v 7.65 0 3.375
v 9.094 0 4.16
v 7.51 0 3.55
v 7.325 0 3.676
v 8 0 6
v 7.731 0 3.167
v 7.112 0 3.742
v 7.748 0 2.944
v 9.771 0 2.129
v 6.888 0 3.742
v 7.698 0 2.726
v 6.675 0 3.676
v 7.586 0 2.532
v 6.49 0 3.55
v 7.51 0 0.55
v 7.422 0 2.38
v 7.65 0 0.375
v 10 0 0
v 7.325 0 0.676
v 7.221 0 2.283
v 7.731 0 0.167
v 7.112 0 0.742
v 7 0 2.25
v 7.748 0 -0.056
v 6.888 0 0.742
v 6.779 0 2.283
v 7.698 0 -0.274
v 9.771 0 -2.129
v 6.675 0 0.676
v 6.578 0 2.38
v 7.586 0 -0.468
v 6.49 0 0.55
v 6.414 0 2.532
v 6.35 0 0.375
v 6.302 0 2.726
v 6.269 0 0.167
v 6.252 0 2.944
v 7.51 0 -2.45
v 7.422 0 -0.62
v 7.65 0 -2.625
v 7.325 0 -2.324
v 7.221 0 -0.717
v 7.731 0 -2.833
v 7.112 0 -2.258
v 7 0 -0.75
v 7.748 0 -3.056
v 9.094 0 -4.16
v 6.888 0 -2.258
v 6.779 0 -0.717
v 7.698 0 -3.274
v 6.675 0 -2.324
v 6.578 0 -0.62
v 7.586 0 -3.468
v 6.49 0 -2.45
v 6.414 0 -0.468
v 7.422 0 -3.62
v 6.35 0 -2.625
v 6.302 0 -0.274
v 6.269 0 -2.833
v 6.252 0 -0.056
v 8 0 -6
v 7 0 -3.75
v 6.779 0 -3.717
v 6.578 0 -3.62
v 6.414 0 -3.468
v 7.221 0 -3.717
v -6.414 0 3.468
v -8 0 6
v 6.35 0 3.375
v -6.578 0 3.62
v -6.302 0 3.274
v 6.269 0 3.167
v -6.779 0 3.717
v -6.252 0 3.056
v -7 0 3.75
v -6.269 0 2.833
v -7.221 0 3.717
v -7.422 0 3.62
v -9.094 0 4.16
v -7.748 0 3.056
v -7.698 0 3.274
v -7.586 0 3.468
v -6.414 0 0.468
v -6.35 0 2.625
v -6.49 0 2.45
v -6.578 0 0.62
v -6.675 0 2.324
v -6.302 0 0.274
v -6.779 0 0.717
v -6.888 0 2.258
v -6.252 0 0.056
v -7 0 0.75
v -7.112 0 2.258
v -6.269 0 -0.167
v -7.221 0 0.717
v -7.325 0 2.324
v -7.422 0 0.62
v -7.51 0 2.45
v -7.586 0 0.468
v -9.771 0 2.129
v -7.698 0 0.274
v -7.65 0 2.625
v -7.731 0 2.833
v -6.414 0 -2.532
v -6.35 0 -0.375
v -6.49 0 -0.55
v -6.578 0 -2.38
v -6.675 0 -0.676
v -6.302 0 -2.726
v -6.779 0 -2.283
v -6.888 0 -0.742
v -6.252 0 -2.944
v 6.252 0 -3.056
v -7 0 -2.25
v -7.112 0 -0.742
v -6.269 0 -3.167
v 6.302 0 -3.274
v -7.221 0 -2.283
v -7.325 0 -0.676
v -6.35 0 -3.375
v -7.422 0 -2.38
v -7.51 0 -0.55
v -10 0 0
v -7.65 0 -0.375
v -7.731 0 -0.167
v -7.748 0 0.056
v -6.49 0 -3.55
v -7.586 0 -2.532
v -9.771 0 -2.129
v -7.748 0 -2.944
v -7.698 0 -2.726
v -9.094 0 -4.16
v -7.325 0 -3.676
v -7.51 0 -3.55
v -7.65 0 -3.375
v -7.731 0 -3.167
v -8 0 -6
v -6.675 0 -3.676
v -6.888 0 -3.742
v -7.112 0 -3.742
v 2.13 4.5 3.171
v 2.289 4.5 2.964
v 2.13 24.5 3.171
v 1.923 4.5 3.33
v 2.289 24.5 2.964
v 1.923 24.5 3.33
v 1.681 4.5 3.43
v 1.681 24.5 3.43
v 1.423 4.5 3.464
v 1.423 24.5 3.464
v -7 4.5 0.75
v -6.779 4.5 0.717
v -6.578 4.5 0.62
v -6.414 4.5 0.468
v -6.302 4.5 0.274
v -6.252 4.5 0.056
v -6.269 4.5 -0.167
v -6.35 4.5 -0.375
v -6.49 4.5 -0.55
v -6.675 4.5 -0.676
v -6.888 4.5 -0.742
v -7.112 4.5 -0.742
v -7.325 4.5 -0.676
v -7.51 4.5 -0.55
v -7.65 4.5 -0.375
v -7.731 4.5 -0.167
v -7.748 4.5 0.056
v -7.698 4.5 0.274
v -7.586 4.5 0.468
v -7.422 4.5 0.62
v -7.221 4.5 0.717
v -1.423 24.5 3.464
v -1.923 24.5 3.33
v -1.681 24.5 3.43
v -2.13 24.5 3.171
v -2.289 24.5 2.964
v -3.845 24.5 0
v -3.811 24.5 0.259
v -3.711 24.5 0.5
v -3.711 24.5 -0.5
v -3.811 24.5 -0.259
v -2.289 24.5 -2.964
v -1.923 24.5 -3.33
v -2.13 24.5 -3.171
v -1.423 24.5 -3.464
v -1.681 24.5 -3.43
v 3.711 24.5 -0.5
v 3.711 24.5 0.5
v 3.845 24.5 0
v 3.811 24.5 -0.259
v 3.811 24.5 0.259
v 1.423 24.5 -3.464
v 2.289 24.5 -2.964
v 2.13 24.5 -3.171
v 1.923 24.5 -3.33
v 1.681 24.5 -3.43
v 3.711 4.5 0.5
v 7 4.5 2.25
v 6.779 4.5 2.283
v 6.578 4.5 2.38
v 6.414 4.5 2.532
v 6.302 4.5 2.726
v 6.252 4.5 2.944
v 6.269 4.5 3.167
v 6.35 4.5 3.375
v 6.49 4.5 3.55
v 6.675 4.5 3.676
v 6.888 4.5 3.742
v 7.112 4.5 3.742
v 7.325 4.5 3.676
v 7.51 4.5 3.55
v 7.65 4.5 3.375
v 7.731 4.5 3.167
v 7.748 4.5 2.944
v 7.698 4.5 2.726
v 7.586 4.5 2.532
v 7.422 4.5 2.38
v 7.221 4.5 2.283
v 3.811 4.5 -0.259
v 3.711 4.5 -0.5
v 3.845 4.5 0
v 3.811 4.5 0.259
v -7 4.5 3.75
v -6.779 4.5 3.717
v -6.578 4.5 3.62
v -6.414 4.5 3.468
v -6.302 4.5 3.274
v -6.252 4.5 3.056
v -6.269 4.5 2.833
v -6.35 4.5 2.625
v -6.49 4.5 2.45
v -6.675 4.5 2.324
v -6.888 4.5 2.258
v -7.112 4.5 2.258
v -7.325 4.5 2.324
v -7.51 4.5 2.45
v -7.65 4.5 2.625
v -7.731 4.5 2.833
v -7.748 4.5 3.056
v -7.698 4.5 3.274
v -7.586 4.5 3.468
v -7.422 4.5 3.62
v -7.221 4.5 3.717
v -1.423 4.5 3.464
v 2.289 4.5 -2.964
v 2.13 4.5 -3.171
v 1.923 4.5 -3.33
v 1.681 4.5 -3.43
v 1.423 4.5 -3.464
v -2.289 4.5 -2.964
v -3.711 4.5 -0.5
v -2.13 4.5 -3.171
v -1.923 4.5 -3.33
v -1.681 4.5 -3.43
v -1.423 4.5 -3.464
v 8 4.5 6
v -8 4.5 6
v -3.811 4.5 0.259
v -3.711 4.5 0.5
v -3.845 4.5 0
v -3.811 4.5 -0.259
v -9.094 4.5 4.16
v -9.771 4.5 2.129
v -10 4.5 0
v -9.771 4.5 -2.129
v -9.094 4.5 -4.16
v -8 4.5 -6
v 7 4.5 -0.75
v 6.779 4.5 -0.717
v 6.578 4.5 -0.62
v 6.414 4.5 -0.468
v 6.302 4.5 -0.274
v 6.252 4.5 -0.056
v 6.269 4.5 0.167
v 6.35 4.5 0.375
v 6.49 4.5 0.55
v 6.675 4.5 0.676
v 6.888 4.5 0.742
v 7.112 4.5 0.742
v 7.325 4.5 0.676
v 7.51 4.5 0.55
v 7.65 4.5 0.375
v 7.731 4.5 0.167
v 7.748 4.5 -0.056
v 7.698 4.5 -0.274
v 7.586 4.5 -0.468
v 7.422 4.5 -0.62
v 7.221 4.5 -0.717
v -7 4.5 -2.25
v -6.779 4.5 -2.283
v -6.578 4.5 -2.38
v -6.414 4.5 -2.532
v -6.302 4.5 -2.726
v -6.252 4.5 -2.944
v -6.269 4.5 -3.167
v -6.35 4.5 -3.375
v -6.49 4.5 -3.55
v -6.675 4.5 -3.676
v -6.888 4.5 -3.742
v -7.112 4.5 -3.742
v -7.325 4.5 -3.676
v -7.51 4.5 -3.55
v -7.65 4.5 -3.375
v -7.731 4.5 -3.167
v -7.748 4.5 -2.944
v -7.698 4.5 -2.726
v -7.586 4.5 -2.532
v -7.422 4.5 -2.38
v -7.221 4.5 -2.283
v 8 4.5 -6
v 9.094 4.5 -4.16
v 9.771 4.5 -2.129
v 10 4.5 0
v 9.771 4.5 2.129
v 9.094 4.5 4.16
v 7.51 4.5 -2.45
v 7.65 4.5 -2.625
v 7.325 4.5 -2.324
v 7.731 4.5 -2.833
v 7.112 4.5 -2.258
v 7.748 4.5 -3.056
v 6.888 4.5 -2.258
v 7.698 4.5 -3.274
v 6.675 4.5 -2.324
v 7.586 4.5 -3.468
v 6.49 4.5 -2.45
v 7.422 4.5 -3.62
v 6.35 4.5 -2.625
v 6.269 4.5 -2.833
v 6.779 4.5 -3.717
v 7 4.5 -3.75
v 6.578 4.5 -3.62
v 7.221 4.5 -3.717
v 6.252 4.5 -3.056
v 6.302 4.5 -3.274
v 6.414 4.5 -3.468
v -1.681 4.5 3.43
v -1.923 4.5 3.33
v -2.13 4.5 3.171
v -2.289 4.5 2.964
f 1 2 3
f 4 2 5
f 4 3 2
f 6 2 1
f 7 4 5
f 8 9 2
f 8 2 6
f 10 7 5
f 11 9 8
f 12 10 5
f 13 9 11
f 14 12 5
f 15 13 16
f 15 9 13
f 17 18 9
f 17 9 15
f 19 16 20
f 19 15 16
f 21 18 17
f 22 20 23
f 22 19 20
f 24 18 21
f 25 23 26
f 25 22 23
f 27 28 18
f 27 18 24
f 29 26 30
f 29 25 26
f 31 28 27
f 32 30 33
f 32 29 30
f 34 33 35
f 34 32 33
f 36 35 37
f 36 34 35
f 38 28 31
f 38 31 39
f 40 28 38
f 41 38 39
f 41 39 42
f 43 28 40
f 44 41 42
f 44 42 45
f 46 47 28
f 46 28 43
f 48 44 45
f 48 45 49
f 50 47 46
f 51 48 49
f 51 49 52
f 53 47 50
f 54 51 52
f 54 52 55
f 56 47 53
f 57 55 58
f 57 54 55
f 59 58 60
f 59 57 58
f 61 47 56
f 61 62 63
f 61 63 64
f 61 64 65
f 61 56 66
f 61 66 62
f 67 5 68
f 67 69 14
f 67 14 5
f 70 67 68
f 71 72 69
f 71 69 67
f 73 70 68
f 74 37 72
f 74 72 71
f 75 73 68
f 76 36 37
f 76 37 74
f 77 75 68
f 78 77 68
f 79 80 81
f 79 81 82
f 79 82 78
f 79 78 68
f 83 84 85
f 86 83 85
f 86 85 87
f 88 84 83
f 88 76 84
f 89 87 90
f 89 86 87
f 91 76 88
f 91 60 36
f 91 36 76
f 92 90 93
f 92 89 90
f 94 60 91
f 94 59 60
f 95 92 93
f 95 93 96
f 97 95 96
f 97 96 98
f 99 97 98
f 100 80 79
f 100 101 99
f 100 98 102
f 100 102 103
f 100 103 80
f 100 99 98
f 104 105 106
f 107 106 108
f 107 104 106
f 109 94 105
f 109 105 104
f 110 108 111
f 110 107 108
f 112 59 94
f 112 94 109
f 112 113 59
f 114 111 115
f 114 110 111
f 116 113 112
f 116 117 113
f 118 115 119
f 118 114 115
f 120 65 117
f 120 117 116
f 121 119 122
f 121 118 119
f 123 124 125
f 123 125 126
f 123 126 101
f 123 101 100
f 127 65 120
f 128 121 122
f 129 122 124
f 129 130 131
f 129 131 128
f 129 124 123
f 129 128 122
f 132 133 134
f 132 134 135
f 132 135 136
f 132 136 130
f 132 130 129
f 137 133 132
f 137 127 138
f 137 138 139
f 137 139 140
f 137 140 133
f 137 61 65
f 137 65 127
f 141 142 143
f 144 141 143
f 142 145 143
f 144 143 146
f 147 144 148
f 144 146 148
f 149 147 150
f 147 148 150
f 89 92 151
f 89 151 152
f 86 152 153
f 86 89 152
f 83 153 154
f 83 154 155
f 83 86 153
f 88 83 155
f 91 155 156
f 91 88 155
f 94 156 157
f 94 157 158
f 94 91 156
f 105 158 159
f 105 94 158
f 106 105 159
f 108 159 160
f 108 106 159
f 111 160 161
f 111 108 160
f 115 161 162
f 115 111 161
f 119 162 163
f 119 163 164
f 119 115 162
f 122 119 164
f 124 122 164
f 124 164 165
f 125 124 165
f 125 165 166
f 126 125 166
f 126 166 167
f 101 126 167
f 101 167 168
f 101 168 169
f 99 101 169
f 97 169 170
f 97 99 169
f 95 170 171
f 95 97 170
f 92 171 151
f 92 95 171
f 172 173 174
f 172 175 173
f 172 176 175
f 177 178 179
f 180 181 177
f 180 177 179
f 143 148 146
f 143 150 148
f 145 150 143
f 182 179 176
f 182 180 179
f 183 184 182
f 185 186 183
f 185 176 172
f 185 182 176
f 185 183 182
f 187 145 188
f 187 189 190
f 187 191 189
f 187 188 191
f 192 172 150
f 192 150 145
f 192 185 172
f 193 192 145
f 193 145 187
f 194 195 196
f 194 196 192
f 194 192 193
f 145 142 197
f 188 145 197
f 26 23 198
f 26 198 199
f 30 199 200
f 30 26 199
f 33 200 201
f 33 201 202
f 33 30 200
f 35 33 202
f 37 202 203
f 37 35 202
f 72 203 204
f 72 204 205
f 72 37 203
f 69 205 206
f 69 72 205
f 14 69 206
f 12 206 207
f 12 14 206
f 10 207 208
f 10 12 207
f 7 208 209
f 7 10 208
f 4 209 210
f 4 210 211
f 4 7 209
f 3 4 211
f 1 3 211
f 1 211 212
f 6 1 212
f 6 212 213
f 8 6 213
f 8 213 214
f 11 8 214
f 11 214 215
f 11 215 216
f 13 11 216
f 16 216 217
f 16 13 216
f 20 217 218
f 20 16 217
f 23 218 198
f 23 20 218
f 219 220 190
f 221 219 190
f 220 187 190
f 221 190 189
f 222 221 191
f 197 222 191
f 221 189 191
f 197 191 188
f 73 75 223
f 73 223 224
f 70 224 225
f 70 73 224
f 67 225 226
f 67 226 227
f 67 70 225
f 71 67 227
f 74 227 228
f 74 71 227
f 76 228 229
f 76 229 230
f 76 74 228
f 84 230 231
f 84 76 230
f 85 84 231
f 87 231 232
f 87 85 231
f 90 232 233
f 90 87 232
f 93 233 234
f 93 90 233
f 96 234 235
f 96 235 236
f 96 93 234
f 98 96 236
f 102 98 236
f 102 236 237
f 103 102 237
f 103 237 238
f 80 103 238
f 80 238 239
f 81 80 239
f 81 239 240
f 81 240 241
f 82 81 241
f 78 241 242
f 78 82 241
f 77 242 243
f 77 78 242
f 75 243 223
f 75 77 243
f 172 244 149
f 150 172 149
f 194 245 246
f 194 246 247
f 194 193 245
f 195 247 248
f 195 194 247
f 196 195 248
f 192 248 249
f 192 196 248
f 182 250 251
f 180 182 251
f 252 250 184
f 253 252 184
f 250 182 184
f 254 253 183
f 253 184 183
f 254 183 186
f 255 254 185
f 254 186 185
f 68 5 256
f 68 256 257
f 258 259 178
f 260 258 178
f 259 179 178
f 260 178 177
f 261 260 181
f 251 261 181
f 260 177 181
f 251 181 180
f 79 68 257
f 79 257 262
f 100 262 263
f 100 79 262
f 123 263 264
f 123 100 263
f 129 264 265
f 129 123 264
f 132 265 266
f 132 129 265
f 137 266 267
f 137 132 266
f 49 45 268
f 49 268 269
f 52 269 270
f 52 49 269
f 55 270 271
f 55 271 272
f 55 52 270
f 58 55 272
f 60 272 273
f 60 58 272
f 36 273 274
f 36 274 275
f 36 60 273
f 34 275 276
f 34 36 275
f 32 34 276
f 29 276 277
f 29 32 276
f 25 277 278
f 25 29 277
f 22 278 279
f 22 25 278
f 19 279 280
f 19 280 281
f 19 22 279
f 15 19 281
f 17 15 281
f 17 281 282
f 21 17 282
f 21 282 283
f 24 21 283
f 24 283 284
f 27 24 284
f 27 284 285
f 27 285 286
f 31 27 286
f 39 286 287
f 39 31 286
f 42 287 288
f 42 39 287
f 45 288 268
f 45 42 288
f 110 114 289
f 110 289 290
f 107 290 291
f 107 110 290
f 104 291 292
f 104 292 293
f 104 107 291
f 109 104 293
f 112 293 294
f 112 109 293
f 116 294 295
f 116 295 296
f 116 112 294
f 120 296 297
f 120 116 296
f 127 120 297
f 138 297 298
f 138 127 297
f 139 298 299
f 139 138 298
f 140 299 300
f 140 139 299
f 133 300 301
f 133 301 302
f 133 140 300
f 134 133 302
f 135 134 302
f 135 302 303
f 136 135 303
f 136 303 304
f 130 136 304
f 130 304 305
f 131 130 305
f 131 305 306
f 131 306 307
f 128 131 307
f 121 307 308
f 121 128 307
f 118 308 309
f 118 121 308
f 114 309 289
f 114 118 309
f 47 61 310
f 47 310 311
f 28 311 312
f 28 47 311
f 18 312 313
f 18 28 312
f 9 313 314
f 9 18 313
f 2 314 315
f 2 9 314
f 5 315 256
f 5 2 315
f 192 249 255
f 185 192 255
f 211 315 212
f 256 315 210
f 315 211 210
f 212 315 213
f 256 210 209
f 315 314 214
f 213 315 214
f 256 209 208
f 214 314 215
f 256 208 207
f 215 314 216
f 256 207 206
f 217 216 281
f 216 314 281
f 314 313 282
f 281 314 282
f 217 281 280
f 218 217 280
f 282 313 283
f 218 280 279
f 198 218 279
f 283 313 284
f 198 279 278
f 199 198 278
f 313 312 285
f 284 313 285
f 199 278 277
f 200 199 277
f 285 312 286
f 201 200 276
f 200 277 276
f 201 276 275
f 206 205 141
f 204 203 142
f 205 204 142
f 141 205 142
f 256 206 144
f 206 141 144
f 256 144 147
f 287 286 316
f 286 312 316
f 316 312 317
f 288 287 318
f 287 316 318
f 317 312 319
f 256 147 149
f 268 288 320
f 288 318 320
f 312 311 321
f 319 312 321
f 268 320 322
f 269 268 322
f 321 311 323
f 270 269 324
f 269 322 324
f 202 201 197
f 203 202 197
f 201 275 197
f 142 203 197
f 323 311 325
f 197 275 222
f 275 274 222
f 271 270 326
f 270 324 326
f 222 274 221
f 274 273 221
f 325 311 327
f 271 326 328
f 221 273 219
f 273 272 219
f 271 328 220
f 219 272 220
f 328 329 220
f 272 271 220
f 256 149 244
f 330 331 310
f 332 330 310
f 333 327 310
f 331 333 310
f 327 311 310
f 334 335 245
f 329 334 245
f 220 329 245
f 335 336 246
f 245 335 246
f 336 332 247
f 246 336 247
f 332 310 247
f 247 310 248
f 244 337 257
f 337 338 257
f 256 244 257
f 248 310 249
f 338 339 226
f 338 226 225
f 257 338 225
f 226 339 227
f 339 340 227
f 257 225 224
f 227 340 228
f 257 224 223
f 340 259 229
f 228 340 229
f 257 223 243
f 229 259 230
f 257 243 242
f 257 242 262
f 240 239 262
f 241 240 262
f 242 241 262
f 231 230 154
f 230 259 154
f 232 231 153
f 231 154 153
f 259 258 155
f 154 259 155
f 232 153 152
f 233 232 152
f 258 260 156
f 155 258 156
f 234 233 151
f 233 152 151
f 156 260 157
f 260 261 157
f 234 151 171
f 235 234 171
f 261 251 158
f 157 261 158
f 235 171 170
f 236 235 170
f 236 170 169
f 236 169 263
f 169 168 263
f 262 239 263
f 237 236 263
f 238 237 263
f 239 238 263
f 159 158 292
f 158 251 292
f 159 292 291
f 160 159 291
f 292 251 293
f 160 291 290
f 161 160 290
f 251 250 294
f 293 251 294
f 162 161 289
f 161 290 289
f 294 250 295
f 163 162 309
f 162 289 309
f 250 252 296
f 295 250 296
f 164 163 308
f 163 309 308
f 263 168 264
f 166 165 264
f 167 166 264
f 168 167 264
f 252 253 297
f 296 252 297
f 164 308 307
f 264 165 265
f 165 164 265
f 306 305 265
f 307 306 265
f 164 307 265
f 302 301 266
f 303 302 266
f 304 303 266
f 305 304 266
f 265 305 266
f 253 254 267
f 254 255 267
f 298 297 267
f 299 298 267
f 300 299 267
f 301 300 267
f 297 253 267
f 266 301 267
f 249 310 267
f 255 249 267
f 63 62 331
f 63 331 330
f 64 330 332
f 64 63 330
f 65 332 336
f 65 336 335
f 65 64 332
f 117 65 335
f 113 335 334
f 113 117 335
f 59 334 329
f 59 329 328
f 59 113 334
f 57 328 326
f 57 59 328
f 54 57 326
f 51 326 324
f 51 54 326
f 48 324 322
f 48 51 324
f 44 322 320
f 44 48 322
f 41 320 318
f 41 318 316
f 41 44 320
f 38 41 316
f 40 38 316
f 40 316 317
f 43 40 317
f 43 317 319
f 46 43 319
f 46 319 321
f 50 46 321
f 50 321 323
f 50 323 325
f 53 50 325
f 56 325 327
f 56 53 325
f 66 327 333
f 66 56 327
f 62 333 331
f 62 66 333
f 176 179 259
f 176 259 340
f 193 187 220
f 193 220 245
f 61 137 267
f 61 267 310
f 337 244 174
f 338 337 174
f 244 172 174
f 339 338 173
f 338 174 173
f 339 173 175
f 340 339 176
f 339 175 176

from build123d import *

# Parameters (mm, degrees)
SKETCH_1_R      = 0.75
EXTRUDE_1_DEPTH = 4.5
EXTRUDE_2_DEPTH = 20
FILLET_1_R      = 1


with BuildPart() as part:
    # Эскиз1 → Бобышка-Вытянуть1 (new body)
    with BuildSketch(Plane(origin=(0, 0, 0), x_dir=(1, 0, 0), z_dir=(0, 1, 0))):
        with BuildLine():
            Line((-8, 6), (8, 6))
            ThreePointArc((8, 6), (10, 0), (8, -6))
            Line((8, -6), (-8, -6))
            ThreePointArc((-8, -6), (-10, 0), (-8, 6))
        make_face()
        with Locations(Location((-7, 3, 0), (0, 0, 270))):
            Circle(SKETCH_1_R, mode=Mode.SUBTRACT)
        with Locations(Location((-7, 0, 0), (0, 0, 270))):
            Circle(SKETCH_1_R, mode=Mode.SUBTRACT)
        with Locations(Location((-7, -3, 0), (0, 0, 270))):
            Circle(SKETCH_1_R, mode=Mode.SUBTRACT)
        with Locations(Location((7, -3, 0), (0, 0, 90))):
            Circle(SKETCH_1_R, mode=Mode.SUBTRACT)
        with Locations(Location((7, 0, 0), (0, 0, 90))):
            Circle(SKETCH_1_R, mode=Mode.SUBTRACT)
        with Locations(Location((7, 3, 0), (0, 0, 90))):
            Circle(SKETCH_1_R, mode=Mode.SUBTRACT)
    extrude(amount=EXTRUDE_1_DEPTH)

    # Эскиз2 → Бобышка-Вытянуть2 (add)
    with BuildSketch(Plane(origin=(0, 4.5, 0), x_dir=(1, 0, 0), z_dir=(0, 1, 0))):
        Polygon((2, 3.464101615), (-2, 3.464101615), (-4, 0), (-2, -3.464101615), (2, -3.464101615), (4, 0), align=None)
    extrude(amount=EXTRUDE_2_DEPTH)

    # Скругление1
    fillet_1_edges = [part.edges().sort_by_distance(p)[0] for p in [
        (4, 14.5, 0),
        (2, 14.5, -3.464101615),
        (-2, 14.5, -3.464101615),
        (-4, 14.5, 0),
        (-2, 14.5, 3.464101615),
        (2, 14.5, 3.464101615),
    ]]
    fillet(fillet_1_edges, radius=FILLET_1_R)


solid = part.part
